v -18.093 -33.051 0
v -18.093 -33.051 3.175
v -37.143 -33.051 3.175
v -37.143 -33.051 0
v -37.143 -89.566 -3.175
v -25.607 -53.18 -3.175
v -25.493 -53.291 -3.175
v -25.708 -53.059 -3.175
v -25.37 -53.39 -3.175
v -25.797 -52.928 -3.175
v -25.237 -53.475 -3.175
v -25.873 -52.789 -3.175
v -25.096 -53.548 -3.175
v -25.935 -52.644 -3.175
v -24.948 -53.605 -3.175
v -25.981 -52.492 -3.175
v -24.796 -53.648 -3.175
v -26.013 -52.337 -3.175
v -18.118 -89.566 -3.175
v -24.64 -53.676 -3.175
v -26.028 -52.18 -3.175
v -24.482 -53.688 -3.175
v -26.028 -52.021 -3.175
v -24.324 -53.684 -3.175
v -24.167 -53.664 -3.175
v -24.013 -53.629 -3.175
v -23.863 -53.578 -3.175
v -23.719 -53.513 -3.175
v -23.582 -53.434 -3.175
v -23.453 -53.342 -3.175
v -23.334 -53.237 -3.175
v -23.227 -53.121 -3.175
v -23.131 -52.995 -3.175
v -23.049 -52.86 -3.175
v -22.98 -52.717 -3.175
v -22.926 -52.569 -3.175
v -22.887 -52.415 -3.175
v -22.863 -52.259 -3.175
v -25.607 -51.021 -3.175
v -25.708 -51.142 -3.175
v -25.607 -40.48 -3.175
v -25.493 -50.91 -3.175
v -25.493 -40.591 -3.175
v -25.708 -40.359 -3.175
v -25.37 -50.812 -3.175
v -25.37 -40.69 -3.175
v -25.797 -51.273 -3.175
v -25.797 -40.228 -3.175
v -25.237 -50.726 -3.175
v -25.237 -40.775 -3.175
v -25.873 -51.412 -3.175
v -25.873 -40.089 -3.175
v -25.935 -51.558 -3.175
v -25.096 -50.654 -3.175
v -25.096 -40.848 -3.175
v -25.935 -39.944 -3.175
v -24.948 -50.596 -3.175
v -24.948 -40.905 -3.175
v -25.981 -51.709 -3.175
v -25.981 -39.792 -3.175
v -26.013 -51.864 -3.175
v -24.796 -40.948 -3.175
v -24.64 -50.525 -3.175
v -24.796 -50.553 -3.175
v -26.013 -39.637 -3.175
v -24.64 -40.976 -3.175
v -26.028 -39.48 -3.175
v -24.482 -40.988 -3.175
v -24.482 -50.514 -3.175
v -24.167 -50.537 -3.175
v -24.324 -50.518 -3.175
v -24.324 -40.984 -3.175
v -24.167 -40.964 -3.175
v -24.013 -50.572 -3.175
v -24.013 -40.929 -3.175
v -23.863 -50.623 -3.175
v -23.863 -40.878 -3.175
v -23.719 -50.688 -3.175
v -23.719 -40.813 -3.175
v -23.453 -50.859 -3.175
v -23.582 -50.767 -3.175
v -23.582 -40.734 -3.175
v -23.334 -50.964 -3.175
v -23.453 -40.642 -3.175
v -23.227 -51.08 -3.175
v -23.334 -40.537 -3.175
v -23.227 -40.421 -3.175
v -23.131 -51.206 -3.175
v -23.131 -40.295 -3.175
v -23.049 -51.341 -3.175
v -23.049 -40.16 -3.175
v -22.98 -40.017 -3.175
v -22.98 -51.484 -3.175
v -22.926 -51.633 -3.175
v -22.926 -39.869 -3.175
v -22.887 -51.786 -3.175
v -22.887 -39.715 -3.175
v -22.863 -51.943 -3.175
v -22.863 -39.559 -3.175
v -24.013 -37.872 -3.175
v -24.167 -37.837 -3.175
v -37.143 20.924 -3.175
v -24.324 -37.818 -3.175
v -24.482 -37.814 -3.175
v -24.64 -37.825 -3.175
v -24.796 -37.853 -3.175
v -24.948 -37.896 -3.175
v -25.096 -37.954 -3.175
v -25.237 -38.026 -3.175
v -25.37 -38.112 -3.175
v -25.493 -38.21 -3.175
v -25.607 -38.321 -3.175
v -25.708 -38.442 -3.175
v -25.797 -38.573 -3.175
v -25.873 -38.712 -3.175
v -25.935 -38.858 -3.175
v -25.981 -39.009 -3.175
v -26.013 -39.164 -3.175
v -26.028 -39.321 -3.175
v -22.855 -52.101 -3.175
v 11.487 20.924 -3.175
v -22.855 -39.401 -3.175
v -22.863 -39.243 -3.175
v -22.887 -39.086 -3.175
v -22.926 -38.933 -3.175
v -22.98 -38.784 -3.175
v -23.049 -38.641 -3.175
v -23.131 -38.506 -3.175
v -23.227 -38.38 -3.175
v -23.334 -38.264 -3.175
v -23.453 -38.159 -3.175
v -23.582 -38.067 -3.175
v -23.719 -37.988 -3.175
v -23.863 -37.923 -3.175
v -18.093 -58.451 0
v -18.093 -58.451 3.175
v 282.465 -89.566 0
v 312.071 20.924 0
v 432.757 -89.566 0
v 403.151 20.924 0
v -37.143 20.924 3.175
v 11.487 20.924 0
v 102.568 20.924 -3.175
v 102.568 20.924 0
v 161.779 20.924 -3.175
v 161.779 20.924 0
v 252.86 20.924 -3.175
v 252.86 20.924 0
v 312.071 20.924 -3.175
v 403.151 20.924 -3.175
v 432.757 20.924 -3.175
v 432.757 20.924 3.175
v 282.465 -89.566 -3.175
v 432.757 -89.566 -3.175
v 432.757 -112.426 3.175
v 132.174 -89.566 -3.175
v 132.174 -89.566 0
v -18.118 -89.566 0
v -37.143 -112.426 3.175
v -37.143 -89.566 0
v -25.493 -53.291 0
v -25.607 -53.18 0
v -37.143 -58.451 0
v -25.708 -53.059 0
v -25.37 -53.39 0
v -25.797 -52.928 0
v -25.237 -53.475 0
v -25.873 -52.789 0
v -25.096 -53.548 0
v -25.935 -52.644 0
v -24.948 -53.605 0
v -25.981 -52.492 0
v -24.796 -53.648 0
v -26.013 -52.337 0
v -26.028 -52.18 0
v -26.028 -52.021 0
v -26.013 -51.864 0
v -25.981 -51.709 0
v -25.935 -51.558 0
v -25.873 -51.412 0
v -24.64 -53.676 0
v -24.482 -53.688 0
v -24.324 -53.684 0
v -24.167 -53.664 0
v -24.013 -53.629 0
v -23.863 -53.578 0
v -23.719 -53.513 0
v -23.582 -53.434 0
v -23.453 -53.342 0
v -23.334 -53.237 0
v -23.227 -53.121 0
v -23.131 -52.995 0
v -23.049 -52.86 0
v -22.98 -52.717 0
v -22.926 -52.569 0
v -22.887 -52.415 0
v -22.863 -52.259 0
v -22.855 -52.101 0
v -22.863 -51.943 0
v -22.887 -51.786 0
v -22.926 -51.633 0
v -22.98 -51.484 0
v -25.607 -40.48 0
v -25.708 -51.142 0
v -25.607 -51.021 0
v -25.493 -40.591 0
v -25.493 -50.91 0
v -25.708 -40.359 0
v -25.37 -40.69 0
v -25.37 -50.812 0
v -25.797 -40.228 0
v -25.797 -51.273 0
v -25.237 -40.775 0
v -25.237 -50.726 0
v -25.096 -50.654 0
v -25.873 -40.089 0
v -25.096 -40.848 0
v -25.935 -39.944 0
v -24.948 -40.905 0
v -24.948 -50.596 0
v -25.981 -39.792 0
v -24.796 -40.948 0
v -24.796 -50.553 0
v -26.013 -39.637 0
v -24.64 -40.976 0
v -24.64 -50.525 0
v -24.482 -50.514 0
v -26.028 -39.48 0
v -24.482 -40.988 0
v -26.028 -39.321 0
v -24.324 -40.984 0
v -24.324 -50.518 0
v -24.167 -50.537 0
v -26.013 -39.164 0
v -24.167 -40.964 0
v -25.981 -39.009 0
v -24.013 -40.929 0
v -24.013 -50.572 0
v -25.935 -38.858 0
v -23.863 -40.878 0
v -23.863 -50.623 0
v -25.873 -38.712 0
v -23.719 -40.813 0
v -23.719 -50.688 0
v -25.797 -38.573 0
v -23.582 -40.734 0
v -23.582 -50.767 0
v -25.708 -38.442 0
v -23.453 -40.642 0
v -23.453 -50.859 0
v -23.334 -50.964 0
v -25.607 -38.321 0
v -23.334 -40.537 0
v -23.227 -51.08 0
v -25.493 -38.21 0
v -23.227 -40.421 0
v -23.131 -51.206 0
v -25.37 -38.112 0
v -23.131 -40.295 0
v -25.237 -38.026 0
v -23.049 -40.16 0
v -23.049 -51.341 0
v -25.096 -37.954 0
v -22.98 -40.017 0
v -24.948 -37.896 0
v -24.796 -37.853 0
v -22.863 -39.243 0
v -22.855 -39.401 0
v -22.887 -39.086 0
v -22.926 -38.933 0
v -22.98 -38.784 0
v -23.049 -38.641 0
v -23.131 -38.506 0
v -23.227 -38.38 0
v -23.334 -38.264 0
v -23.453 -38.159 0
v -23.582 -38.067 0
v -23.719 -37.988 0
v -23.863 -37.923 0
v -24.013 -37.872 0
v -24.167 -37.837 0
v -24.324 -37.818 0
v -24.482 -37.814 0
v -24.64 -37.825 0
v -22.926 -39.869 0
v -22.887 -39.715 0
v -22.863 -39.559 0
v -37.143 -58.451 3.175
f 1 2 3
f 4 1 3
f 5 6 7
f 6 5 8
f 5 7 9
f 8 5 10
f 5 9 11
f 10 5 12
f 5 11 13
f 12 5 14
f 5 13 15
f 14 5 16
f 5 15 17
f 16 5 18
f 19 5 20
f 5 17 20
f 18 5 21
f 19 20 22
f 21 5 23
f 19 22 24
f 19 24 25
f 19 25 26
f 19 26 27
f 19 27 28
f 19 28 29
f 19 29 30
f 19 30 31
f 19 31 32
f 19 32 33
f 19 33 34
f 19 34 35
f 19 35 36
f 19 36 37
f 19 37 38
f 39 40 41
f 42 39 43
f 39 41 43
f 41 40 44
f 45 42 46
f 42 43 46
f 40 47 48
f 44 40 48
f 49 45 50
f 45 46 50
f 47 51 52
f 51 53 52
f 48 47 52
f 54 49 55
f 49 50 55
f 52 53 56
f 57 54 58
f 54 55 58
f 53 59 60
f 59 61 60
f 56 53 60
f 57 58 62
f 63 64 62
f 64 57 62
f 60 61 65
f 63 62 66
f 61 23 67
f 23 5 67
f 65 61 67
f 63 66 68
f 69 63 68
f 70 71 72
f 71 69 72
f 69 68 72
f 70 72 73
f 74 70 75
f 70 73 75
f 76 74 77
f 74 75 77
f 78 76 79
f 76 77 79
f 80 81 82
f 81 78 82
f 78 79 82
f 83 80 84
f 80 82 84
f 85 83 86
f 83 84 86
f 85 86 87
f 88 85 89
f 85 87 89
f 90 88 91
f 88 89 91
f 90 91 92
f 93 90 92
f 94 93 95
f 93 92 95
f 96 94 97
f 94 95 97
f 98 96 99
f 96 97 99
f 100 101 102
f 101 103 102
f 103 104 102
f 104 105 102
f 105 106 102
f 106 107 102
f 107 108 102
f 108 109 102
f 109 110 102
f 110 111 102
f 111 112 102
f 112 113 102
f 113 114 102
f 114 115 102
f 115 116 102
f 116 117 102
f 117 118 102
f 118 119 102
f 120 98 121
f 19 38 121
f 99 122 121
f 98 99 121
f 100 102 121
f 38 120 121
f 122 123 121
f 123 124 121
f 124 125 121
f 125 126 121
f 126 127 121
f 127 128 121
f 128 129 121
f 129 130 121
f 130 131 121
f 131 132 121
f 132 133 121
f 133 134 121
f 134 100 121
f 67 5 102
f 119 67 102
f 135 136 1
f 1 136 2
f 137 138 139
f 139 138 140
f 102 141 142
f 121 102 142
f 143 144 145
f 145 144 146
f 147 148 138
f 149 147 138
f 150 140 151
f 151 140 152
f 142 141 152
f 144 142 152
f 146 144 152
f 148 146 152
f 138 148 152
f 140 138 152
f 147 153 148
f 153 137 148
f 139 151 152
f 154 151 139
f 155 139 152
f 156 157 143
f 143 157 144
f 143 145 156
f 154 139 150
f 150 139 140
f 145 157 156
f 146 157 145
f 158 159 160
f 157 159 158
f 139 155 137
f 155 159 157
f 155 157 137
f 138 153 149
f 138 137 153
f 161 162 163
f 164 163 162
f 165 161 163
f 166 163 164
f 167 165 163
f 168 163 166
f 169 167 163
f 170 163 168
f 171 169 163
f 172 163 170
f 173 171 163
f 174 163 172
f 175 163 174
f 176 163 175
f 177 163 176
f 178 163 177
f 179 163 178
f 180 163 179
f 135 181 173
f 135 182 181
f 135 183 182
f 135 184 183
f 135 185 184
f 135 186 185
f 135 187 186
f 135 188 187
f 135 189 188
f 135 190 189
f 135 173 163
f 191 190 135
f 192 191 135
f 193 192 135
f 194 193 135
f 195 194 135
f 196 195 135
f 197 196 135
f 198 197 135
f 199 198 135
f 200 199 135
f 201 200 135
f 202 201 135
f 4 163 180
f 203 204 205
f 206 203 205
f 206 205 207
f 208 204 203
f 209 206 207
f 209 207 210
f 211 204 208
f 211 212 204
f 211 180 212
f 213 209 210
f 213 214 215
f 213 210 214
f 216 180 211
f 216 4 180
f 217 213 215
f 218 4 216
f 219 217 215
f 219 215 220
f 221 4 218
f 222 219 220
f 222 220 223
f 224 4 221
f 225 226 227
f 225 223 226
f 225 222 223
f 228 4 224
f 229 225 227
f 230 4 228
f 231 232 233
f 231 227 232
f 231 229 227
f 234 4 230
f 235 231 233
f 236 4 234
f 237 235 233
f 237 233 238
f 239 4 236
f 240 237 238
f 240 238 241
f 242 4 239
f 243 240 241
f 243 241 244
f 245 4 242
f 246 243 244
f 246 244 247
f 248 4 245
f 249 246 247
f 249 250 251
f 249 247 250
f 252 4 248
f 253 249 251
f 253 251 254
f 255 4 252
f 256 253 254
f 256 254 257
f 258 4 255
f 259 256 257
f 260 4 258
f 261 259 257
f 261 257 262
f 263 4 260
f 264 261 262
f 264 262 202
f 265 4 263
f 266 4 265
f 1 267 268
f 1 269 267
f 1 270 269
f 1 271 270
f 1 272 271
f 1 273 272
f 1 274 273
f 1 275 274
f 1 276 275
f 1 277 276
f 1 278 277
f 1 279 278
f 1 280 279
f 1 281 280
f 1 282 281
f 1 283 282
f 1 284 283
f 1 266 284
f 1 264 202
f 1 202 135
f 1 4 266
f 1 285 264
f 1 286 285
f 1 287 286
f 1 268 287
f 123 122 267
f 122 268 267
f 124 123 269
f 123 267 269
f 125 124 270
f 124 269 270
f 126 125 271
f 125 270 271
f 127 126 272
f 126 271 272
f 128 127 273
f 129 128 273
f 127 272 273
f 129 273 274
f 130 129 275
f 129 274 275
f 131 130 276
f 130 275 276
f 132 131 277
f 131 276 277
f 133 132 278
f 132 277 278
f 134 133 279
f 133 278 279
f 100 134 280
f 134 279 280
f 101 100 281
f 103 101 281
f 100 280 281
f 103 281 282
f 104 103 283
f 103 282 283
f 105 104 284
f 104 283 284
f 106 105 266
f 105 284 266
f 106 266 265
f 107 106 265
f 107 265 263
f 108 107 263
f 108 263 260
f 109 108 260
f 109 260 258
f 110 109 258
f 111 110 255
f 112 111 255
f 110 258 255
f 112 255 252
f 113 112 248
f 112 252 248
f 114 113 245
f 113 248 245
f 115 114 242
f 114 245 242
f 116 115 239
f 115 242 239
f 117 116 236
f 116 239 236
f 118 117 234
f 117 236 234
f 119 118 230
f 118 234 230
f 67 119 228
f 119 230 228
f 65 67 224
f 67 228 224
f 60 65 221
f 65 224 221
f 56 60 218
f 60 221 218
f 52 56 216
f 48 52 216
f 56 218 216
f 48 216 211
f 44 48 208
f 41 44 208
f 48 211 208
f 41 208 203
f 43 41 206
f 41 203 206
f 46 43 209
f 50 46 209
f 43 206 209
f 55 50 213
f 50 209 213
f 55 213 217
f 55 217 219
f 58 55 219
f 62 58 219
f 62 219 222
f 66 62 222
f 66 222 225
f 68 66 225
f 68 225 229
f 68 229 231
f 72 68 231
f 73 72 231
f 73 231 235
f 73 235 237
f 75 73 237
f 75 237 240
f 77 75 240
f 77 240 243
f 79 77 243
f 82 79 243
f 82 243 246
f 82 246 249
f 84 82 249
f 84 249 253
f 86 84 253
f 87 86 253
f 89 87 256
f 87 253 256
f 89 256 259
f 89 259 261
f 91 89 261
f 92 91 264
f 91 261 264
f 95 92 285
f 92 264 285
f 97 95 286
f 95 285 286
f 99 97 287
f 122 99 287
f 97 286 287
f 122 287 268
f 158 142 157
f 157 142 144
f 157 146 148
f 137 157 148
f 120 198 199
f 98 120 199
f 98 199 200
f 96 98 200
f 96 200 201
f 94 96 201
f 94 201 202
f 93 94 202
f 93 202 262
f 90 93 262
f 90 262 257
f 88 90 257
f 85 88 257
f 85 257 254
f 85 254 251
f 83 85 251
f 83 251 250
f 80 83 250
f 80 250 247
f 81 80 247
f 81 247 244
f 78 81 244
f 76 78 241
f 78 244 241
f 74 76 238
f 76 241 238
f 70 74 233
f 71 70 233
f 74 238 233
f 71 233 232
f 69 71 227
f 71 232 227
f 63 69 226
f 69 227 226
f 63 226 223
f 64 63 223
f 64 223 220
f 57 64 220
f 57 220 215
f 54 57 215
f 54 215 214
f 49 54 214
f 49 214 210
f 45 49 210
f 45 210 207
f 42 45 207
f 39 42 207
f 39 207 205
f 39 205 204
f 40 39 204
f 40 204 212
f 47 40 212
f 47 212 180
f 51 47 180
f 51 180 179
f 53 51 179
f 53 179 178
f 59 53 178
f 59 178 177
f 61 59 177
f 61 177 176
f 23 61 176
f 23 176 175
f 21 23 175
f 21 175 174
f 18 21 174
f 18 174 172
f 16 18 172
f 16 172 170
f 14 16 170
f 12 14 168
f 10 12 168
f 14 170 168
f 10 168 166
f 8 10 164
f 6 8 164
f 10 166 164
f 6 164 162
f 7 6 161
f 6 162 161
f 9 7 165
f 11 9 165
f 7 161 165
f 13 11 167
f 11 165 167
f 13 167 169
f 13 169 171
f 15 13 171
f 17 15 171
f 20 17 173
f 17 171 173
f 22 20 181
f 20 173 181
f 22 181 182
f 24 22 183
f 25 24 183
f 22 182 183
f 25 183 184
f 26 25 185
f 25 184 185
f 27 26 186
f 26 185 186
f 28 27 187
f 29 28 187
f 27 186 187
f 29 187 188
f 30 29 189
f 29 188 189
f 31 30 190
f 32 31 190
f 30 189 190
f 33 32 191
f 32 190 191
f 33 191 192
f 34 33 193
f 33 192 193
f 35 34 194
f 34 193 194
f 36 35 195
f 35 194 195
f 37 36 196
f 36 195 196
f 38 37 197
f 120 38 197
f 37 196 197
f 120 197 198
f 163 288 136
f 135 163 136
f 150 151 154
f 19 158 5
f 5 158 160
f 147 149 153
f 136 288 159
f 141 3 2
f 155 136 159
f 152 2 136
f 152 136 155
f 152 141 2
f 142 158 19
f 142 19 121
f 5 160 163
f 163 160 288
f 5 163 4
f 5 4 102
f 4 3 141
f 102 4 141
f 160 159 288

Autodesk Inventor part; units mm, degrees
ref_plane "YZ Plane" through (0, 0, 0) normal (1, 0, 0) x (0, 1, 0)
ref_plane "XZ Plane" through (0, 0, 0) normal (0, 1, 0) x (-1, 0, 0)
ref_plane "XY Plane" through (0, 0, 0) normal (0, 0, 1) x (1, 0, 0)
sketch "Sketch1" plane through (0, 0, 0) normal (0, 0, 1) x (1, 0, 0)
  line L0 (-37.1429, 20.9244) -> (432.7571, 20.9244)
  line L1 (432.7571, 20.9244) -> (432.7571, -112.4256)
  line L2 (432.7571, -112.4256) -> (-37.1429, -112.4256)
  line L3 (-37.1429, -112.4256) -> (-37.1429, 20.9244)
  point P0 (0, 0)
  dimension "d0" = 469.9
  dimension "d1" = 133.35
extrude "Extrusion1" add sketch "Sketch1" along normal blind 3.175
sketch "Sketch2" plane through (432.7571, -112.4256, 0) normal (1, 0, 0) x (0, 0, -1)
  line L0 (0, 133.35) -> (0, 0) projected
  line L1 (-3.175, 133.35) -> (0, 107.95)
  line L2 (-3.175, 0) -> (0, 22.86)
  line L3 (-3.175, 0) -> (0, 0)
  line L4 (0, 22.86) -> (0, 0)
  point P0 (0, 112.4256)
  dimension "d4" = 25.4
  dimension "d5" = 22.86
extrude "Extrusion3" cut sketch "Sketch2" against normal blind 476.25
sketch "Sketch4" plane through (0, 0, 0) normal (0, 0, -1) x (-1, 0, 0)
  line L0 (-432.7571, -89.5656) -> (37.1429, -89.5656) projected
  line L1 (37.1429, 20.9244) -> (-432.7571, 20.9244) projected
  line L2 (-432.7571, 20.9244) -> (-432.7571, -89.5656) projected
  line L3 (-432.7571, -89.5656) -> (37.1429, -89.5656)
  line L4 (37.1429, -89.5656) -> (37.1429, 20.9244)
  line L5 (37.1429, 20.9244) -> (-432.7571, 20.9244)
  line L6 (-432.7571, 20.9244) -> (-432.7571, -89.5656)
  line L7 (-282.4653, -89.5656) -> (-282.4653, 20.9244)
  line L8 (-132.1735, -89.5656) -> (-132.1735, 20.9244)
  line L9 (18.1183, -89.5656) -> (18.1183, 20.9244)
  line L10 (-282.4653, -89.5656) -> (-312.071, 20.9244)
  line L11 (-432.7571, -89.5656) -> (-403.1514, 20.9244)
  line L12 (-282.4653, -89.5656) -> (-252.8596, 20.9244)
  line L13 (-132.1735, -89.5656) -> (-161.7792, 20.9244)
  line L14 (-132.1735, -89.5656) -> (-102.5678, 20.9244)
  line L15 (18.1183, -89.5656) -> (-11.4874, 20.9244)
  line L16 (18.1183, 20.9244) -> (37.1429, 20.9244)
  line L17 (37.1429, 20.9244) -> (37.1429, -89.5656)
  line L18 (37.1429, -89.5656) -> (18.1183, -89.5656)
  line L19 (18.1183, -89.5656) -> (18.1183, 20.9244)
  point P0 (0, 0)
  dimension "d10" = 150.2918
  dimension "d11" = 150.2918
  dimension "d12" = 150.2918
  dimension "d13" = 15
  dimension "d14" = 15
  dimension "d15" = 15
extrude "Extrusion4" add sketch "Sketch4" along normal blind 3.175 contours L2 L1 L11 | L10 L1 L7 | L7 L1 L12 | L13 L1 L8 | L8 L1 L14 | L15 L1 L9
sketch "Sketch5" plane through (0, 0, 0) normal (0, 0, -1) x (-1, 0, 0)
  line L0 (18.1183, 20.9244) -> (18.1183, -89.5656) projected
  line L1 (18.1183, -89.5656) -> (37.1429, -89.5656) projected
  line L2 (37.1429, -89.5656) -> (37.1429, 20.9244) projected
  line L3 (37.1429, 20.9244) -> (18.1183, 20.9244) projected
  line L4 (18.1183, 20.9244) -> (37.1429, 20.9244)
  line L5 (37.1429, 20.9244) -> (37.1429, -89.5656)
  line L6 (37.1429, -89.5656) -> (18.1183, -89.5656)
  line L7 (18.1183, -89.5656) -> (18.1183, 20.9244)
  point P0 (0, 0)
sketch "Sketch6" plane through (0, 0, 3.175) normal (0, 0, 1) x (1, 0, 0)
  line L0 (-37.1429, 20.9244) -> (-18.1183, 20.9244)
  line L1 (-18.1183, 20.9244) -> (-18.1183, -89.5656)
  line L2 (-18.1183, -89.5656) -> (-37.1429, -89.5656)
  line L3 (-37.1429, -89.5656) -> (-37.1429, 20.9244)
  point P0 (0, 0)
  dimension "d18" = 110.49
  dimension "d19" = 19.0246
extrude "Extrusion5" add sketch "Sketch6" against normal blind 6.35
sketch "Sketch7" plane through (0, 0, 3.175) normal (0, 0, 1) x (1, 0, 0)
  line L0 (-11.4874, 20.9244) -> (-37.1429, 20.9244)
  line L1 (-18.0929, -33.0506) -> (-37.1429, -33.0506)
  line L2 (-37.1429, -33.0506) -> (-37.1429, -58.4506)
  line L3 (-37.1429, -58.4506) -> (-18.0929, -58.4506)
  line L4 (-18.0929, -58.4506) -> (-18.0929, -33.0506)
  line L5 (-37.1429, -112.4256) -> (-37.1429, 20.9244) projected
  point P0 (0, 0)
  dimension "d22" = 19.05
  dimension "d23" = 25.4
  dimension "d25" = 0
  dimension "d27" = 133.35
  dimension "d28" = 53.975
extrude "Extrusion6" cut sketch "Sketch7" against normal blind 3.175
sketch "Sketch8" plane through (0, 0, 0) normal (0, 0, 1) x (1, 0, 0)
  line L0 (-18.0929, -58.4506) -> (-18.0929, -33.0506) projected
  line L1 (-18.0929, -33.0506) -> (-37.1429, -33.0506) projected
  circle A0 centre (-24.4429, -39.4006) radius 1.5875
  circle A1 centre (-24.4429, -52.1006) radius 1.5875
  point P0 (0, 0)
  dimension "d31" = 3.175
  dimension "d32" = 3.175
  dimension "d33" = 6.35
  dimension "d34" = 12.7
  dimension "d35" = 6.35
extrude "Extrusion7" cut sketch "Sketch8" against normal blind 3.175
properties part number "bottom panel"
